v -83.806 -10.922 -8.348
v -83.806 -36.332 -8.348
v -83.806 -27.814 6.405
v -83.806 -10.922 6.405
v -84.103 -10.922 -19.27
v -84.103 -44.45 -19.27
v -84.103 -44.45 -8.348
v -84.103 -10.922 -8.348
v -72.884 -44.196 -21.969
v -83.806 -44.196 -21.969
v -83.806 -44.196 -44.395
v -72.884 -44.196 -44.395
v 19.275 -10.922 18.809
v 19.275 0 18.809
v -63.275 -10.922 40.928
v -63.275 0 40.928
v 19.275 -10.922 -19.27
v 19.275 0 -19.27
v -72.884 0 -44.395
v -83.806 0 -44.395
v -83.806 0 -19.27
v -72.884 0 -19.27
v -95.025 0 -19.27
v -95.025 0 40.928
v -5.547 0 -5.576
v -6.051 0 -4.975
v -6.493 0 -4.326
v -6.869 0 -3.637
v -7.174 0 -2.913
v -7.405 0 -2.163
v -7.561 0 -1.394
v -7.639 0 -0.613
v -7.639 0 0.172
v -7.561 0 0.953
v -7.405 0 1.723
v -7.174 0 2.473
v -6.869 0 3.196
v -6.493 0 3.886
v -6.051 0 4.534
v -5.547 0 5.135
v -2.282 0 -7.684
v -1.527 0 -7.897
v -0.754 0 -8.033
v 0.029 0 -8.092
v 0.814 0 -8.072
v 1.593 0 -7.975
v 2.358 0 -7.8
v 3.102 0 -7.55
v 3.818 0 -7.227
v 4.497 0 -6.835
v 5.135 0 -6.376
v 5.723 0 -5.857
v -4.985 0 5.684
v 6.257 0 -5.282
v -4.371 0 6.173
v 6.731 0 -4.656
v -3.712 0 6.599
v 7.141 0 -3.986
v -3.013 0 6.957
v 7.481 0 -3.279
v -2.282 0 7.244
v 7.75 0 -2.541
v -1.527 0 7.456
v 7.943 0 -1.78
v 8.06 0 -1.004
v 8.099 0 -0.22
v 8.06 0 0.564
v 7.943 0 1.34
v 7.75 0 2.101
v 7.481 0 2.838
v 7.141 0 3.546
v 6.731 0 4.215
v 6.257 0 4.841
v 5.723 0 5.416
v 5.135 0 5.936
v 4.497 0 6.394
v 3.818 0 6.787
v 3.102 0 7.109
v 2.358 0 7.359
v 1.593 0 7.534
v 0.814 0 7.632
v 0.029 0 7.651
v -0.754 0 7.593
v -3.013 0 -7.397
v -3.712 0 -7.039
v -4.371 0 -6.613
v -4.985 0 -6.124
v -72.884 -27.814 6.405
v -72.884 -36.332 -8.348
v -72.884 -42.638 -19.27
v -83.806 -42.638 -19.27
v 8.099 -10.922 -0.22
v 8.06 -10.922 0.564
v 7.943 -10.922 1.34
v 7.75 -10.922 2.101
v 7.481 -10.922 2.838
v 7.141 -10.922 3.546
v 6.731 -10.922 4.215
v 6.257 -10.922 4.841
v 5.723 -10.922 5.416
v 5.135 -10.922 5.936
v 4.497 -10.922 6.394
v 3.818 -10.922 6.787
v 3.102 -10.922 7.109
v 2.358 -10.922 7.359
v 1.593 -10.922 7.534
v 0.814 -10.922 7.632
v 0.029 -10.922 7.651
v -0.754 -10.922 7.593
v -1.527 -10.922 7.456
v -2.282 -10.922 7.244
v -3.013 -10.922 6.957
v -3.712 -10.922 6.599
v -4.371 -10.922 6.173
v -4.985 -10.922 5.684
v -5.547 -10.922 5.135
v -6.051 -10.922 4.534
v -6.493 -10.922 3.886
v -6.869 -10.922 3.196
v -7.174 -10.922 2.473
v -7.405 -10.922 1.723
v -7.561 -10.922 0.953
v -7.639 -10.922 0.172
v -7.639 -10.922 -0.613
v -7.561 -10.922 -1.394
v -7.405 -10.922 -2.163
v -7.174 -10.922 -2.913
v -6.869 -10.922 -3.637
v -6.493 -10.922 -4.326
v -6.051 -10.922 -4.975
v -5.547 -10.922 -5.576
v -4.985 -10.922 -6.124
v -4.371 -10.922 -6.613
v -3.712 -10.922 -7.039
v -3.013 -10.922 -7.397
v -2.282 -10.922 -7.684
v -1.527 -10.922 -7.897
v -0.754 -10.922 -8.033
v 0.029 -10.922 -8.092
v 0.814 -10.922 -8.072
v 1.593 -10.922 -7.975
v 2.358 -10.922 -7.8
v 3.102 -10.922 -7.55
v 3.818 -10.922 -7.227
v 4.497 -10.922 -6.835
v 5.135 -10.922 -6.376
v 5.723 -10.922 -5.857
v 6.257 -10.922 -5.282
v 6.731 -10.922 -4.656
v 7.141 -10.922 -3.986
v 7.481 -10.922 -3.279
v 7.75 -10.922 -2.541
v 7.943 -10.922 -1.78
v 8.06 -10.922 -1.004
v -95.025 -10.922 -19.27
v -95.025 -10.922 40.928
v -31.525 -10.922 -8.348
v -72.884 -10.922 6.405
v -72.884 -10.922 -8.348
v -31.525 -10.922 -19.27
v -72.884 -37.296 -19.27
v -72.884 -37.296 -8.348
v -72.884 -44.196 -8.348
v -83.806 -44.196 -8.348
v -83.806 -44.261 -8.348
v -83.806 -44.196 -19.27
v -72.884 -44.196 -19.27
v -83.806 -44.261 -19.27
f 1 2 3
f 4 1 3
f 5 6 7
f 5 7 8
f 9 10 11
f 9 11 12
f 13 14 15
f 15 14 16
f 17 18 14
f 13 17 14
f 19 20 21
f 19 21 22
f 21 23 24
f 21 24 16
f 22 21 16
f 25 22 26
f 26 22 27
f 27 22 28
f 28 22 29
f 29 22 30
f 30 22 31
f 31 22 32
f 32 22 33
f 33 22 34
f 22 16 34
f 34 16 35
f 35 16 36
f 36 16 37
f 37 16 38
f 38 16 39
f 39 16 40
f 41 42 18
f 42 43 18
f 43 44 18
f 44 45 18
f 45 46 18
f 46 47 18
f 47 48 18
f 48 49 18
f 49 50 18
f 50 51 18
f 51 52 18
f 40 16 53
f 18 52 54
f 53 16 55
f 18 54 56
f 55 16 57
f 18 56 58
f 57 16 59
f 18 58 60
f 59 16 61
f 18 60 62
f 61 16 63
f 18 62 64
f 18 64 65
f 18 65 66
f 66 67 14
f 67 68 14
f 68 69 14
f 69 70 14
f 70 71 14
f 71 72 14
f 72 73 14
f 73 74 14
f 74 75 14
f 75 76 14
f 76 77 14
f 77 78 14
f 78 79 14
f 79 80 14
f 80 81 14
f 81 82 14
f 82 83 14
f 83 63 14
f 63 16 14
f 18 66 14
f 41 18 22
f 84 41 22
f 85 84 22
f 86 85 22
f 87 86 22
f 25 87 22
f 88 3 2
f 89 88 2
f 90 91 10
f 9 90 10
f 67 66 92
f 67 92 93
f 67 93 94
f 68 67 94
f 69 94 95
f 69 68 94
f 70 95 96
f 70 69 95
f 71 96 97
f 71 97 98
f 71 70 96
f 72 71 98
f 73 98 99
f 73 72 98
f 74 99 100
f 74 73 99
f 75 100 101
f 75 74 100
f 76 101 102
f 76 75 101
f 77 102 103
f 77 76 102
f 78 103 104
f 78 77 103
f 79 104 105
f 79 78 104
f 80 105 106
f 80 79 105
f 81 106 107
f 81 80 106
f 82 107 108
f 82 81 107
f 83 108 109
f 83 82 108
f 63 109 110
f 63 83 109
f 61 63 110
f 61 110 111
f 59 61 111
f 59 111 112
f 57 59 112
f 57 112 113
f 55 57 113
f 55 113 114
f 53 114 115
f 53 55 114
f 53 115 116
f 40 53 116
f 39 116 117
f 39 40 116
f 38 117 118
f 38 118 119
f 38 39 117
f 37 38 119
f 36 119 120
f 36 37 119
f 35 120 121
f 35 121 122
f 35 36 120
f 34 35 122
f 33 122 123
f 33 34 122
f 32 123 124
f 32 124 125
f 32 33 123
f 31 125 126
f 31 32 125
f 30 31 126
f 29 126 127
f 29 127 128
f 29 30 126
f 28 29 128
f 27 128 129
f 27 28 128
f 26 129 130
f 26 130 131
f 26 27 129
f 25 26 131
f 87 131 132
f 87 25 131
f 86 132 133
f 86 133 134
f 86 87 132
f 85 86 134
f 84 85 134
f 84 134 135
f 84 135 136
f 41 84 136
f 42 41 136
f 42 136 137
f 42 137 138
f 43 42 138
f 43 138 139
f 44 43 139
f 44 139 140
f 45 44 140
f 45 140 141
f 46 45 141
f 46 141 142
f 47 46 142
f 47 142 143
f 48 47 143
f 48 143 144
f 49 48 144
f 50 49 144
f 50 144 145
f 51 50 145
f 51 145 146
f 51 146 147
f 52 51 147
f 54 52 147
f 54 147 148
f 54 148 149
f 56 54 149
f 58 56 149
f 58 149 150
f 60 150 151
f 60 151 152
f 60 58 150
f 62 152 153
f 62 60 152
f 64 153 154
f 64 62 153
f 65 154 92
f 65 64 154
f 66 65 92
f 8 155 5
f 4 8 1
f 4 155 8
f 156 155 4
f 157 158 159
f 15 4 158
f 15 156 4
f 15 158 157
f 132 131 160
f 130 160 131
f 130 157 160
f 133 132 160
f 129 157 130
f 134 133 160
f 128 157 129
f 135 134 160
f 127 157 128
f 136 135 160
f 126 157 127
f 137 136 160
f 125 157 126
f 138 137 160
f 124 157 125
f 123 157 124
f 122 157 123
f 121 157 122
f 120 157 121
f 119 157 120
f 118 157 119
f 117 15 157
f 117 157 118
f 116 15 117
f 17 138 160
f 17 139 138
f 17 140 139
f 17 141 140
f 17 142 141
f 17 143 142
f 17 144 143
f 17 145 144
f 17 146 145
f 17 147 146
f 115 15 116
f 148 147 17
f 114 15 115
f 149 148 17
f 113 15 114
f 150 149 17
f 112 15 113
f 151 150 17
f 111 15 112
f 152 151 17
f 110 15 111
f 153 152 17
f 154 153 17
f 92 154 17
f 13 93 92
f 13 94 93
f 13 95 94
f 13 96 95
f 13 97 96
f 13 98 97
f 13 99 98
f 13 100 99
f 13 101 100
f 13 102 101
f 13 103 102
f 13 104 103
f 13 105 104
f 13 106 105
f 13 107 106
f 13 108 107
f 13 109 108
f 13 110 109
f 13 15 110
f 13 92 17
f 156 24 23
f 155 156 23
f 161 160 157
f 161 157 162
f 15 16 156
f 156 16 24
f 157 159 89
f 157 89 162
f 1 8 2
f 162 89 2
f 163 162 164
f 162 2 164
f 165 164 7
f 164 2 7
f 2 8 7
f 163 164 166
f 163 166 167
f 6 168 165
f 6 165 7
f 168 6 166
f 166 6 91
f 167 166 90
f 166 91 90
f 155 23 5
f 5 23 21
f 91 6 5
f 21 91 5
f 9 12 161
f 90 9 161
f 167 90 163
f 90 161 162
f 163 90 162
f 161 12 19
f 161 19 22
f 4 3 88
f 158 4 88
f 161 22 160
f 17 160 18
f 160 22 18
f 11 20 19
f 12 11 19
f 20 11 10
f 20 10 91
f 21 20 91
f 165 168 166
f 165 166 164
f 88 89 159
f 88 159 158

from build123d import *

# Parameters (mm, degrees)
F0_R     = 7.874
F1_DEPTH = 10.922
F3_DEPTH = 10.922
F4_W     = 10.922
F4_H     = 50.8
F5_DEPTH = 44.45
F7_DEPTH = 25.4
F8_DEPTH = 0.254


with BuildPart() as f1:
    # F0 (on Front) → F1 (new body)
    with BuildSketch(Plane.XZ):
        Polygon((-95.0245559216, 40.9277565777), (-95.0245559216, -19.2702434223), (19.2754440784, -19.2702434223), (19.2754440784, 18.8085507425), (-63.2745559216, 40.9277565777), align=None)
        with Locations((0.2254440784, -0.2202434223)):
            Circle(F0_R, mode=Mode.SUBTRACT)
    extrude(amount=F1_DEPTH)

    # F2 (on face) → F3 (join)
    with BuildSketch(Plane(origin=(0, 0, -19.2702434223), x_dir=(1, 0, 0), z_dir=(0, 0, -1))):
        Polygon((-31.5245559216, 10.922), (-84.1025559216, 44.45), (-84.1025559216, 10.922), align=None)
    extrude(amount=-F3_DEPTH)

    # F4 (on Front) → F5 (join)
    with BuildSketch(Plane.XZ):
        with Locations((-78.3454434941, -18.9951797947)):
            Rectangle(F4_W, F4_H)
    extrude(amount=F5_DEPTH)

    # F6 (on face) → F7 (cut)
    with BuildSketch(Plane(origin=(-83.8064434941, 0, 0), x_dir=(0, -1, 0), z_dir=(-1, 0, 0))):
        Polygon((44.45, 6.4048202053), (27.814247327, 6.4048202053), (36.3319325837, -8.3482434223), (44.261174684, -8.3482434223), (44.261174684, -19.2702434223), (42.6377522238, -19.2702434223), (44.3853547532, -22.2971797947), align=None)
    extrude(amount=-F7_DEPTH, mode=Mode.SUBTRACT)

    # F8 (cut): a face of the model
    f8_faces = [f1.faces().sort_by_distance(p)[0] for p in [
        (-78.3454434941, -44.45, -18.9951797947),
    ]]
    extrude(f8_faces, amount=-F8_DEPTH, mode=Mode.SUBTRACT)


solid = f1.part
